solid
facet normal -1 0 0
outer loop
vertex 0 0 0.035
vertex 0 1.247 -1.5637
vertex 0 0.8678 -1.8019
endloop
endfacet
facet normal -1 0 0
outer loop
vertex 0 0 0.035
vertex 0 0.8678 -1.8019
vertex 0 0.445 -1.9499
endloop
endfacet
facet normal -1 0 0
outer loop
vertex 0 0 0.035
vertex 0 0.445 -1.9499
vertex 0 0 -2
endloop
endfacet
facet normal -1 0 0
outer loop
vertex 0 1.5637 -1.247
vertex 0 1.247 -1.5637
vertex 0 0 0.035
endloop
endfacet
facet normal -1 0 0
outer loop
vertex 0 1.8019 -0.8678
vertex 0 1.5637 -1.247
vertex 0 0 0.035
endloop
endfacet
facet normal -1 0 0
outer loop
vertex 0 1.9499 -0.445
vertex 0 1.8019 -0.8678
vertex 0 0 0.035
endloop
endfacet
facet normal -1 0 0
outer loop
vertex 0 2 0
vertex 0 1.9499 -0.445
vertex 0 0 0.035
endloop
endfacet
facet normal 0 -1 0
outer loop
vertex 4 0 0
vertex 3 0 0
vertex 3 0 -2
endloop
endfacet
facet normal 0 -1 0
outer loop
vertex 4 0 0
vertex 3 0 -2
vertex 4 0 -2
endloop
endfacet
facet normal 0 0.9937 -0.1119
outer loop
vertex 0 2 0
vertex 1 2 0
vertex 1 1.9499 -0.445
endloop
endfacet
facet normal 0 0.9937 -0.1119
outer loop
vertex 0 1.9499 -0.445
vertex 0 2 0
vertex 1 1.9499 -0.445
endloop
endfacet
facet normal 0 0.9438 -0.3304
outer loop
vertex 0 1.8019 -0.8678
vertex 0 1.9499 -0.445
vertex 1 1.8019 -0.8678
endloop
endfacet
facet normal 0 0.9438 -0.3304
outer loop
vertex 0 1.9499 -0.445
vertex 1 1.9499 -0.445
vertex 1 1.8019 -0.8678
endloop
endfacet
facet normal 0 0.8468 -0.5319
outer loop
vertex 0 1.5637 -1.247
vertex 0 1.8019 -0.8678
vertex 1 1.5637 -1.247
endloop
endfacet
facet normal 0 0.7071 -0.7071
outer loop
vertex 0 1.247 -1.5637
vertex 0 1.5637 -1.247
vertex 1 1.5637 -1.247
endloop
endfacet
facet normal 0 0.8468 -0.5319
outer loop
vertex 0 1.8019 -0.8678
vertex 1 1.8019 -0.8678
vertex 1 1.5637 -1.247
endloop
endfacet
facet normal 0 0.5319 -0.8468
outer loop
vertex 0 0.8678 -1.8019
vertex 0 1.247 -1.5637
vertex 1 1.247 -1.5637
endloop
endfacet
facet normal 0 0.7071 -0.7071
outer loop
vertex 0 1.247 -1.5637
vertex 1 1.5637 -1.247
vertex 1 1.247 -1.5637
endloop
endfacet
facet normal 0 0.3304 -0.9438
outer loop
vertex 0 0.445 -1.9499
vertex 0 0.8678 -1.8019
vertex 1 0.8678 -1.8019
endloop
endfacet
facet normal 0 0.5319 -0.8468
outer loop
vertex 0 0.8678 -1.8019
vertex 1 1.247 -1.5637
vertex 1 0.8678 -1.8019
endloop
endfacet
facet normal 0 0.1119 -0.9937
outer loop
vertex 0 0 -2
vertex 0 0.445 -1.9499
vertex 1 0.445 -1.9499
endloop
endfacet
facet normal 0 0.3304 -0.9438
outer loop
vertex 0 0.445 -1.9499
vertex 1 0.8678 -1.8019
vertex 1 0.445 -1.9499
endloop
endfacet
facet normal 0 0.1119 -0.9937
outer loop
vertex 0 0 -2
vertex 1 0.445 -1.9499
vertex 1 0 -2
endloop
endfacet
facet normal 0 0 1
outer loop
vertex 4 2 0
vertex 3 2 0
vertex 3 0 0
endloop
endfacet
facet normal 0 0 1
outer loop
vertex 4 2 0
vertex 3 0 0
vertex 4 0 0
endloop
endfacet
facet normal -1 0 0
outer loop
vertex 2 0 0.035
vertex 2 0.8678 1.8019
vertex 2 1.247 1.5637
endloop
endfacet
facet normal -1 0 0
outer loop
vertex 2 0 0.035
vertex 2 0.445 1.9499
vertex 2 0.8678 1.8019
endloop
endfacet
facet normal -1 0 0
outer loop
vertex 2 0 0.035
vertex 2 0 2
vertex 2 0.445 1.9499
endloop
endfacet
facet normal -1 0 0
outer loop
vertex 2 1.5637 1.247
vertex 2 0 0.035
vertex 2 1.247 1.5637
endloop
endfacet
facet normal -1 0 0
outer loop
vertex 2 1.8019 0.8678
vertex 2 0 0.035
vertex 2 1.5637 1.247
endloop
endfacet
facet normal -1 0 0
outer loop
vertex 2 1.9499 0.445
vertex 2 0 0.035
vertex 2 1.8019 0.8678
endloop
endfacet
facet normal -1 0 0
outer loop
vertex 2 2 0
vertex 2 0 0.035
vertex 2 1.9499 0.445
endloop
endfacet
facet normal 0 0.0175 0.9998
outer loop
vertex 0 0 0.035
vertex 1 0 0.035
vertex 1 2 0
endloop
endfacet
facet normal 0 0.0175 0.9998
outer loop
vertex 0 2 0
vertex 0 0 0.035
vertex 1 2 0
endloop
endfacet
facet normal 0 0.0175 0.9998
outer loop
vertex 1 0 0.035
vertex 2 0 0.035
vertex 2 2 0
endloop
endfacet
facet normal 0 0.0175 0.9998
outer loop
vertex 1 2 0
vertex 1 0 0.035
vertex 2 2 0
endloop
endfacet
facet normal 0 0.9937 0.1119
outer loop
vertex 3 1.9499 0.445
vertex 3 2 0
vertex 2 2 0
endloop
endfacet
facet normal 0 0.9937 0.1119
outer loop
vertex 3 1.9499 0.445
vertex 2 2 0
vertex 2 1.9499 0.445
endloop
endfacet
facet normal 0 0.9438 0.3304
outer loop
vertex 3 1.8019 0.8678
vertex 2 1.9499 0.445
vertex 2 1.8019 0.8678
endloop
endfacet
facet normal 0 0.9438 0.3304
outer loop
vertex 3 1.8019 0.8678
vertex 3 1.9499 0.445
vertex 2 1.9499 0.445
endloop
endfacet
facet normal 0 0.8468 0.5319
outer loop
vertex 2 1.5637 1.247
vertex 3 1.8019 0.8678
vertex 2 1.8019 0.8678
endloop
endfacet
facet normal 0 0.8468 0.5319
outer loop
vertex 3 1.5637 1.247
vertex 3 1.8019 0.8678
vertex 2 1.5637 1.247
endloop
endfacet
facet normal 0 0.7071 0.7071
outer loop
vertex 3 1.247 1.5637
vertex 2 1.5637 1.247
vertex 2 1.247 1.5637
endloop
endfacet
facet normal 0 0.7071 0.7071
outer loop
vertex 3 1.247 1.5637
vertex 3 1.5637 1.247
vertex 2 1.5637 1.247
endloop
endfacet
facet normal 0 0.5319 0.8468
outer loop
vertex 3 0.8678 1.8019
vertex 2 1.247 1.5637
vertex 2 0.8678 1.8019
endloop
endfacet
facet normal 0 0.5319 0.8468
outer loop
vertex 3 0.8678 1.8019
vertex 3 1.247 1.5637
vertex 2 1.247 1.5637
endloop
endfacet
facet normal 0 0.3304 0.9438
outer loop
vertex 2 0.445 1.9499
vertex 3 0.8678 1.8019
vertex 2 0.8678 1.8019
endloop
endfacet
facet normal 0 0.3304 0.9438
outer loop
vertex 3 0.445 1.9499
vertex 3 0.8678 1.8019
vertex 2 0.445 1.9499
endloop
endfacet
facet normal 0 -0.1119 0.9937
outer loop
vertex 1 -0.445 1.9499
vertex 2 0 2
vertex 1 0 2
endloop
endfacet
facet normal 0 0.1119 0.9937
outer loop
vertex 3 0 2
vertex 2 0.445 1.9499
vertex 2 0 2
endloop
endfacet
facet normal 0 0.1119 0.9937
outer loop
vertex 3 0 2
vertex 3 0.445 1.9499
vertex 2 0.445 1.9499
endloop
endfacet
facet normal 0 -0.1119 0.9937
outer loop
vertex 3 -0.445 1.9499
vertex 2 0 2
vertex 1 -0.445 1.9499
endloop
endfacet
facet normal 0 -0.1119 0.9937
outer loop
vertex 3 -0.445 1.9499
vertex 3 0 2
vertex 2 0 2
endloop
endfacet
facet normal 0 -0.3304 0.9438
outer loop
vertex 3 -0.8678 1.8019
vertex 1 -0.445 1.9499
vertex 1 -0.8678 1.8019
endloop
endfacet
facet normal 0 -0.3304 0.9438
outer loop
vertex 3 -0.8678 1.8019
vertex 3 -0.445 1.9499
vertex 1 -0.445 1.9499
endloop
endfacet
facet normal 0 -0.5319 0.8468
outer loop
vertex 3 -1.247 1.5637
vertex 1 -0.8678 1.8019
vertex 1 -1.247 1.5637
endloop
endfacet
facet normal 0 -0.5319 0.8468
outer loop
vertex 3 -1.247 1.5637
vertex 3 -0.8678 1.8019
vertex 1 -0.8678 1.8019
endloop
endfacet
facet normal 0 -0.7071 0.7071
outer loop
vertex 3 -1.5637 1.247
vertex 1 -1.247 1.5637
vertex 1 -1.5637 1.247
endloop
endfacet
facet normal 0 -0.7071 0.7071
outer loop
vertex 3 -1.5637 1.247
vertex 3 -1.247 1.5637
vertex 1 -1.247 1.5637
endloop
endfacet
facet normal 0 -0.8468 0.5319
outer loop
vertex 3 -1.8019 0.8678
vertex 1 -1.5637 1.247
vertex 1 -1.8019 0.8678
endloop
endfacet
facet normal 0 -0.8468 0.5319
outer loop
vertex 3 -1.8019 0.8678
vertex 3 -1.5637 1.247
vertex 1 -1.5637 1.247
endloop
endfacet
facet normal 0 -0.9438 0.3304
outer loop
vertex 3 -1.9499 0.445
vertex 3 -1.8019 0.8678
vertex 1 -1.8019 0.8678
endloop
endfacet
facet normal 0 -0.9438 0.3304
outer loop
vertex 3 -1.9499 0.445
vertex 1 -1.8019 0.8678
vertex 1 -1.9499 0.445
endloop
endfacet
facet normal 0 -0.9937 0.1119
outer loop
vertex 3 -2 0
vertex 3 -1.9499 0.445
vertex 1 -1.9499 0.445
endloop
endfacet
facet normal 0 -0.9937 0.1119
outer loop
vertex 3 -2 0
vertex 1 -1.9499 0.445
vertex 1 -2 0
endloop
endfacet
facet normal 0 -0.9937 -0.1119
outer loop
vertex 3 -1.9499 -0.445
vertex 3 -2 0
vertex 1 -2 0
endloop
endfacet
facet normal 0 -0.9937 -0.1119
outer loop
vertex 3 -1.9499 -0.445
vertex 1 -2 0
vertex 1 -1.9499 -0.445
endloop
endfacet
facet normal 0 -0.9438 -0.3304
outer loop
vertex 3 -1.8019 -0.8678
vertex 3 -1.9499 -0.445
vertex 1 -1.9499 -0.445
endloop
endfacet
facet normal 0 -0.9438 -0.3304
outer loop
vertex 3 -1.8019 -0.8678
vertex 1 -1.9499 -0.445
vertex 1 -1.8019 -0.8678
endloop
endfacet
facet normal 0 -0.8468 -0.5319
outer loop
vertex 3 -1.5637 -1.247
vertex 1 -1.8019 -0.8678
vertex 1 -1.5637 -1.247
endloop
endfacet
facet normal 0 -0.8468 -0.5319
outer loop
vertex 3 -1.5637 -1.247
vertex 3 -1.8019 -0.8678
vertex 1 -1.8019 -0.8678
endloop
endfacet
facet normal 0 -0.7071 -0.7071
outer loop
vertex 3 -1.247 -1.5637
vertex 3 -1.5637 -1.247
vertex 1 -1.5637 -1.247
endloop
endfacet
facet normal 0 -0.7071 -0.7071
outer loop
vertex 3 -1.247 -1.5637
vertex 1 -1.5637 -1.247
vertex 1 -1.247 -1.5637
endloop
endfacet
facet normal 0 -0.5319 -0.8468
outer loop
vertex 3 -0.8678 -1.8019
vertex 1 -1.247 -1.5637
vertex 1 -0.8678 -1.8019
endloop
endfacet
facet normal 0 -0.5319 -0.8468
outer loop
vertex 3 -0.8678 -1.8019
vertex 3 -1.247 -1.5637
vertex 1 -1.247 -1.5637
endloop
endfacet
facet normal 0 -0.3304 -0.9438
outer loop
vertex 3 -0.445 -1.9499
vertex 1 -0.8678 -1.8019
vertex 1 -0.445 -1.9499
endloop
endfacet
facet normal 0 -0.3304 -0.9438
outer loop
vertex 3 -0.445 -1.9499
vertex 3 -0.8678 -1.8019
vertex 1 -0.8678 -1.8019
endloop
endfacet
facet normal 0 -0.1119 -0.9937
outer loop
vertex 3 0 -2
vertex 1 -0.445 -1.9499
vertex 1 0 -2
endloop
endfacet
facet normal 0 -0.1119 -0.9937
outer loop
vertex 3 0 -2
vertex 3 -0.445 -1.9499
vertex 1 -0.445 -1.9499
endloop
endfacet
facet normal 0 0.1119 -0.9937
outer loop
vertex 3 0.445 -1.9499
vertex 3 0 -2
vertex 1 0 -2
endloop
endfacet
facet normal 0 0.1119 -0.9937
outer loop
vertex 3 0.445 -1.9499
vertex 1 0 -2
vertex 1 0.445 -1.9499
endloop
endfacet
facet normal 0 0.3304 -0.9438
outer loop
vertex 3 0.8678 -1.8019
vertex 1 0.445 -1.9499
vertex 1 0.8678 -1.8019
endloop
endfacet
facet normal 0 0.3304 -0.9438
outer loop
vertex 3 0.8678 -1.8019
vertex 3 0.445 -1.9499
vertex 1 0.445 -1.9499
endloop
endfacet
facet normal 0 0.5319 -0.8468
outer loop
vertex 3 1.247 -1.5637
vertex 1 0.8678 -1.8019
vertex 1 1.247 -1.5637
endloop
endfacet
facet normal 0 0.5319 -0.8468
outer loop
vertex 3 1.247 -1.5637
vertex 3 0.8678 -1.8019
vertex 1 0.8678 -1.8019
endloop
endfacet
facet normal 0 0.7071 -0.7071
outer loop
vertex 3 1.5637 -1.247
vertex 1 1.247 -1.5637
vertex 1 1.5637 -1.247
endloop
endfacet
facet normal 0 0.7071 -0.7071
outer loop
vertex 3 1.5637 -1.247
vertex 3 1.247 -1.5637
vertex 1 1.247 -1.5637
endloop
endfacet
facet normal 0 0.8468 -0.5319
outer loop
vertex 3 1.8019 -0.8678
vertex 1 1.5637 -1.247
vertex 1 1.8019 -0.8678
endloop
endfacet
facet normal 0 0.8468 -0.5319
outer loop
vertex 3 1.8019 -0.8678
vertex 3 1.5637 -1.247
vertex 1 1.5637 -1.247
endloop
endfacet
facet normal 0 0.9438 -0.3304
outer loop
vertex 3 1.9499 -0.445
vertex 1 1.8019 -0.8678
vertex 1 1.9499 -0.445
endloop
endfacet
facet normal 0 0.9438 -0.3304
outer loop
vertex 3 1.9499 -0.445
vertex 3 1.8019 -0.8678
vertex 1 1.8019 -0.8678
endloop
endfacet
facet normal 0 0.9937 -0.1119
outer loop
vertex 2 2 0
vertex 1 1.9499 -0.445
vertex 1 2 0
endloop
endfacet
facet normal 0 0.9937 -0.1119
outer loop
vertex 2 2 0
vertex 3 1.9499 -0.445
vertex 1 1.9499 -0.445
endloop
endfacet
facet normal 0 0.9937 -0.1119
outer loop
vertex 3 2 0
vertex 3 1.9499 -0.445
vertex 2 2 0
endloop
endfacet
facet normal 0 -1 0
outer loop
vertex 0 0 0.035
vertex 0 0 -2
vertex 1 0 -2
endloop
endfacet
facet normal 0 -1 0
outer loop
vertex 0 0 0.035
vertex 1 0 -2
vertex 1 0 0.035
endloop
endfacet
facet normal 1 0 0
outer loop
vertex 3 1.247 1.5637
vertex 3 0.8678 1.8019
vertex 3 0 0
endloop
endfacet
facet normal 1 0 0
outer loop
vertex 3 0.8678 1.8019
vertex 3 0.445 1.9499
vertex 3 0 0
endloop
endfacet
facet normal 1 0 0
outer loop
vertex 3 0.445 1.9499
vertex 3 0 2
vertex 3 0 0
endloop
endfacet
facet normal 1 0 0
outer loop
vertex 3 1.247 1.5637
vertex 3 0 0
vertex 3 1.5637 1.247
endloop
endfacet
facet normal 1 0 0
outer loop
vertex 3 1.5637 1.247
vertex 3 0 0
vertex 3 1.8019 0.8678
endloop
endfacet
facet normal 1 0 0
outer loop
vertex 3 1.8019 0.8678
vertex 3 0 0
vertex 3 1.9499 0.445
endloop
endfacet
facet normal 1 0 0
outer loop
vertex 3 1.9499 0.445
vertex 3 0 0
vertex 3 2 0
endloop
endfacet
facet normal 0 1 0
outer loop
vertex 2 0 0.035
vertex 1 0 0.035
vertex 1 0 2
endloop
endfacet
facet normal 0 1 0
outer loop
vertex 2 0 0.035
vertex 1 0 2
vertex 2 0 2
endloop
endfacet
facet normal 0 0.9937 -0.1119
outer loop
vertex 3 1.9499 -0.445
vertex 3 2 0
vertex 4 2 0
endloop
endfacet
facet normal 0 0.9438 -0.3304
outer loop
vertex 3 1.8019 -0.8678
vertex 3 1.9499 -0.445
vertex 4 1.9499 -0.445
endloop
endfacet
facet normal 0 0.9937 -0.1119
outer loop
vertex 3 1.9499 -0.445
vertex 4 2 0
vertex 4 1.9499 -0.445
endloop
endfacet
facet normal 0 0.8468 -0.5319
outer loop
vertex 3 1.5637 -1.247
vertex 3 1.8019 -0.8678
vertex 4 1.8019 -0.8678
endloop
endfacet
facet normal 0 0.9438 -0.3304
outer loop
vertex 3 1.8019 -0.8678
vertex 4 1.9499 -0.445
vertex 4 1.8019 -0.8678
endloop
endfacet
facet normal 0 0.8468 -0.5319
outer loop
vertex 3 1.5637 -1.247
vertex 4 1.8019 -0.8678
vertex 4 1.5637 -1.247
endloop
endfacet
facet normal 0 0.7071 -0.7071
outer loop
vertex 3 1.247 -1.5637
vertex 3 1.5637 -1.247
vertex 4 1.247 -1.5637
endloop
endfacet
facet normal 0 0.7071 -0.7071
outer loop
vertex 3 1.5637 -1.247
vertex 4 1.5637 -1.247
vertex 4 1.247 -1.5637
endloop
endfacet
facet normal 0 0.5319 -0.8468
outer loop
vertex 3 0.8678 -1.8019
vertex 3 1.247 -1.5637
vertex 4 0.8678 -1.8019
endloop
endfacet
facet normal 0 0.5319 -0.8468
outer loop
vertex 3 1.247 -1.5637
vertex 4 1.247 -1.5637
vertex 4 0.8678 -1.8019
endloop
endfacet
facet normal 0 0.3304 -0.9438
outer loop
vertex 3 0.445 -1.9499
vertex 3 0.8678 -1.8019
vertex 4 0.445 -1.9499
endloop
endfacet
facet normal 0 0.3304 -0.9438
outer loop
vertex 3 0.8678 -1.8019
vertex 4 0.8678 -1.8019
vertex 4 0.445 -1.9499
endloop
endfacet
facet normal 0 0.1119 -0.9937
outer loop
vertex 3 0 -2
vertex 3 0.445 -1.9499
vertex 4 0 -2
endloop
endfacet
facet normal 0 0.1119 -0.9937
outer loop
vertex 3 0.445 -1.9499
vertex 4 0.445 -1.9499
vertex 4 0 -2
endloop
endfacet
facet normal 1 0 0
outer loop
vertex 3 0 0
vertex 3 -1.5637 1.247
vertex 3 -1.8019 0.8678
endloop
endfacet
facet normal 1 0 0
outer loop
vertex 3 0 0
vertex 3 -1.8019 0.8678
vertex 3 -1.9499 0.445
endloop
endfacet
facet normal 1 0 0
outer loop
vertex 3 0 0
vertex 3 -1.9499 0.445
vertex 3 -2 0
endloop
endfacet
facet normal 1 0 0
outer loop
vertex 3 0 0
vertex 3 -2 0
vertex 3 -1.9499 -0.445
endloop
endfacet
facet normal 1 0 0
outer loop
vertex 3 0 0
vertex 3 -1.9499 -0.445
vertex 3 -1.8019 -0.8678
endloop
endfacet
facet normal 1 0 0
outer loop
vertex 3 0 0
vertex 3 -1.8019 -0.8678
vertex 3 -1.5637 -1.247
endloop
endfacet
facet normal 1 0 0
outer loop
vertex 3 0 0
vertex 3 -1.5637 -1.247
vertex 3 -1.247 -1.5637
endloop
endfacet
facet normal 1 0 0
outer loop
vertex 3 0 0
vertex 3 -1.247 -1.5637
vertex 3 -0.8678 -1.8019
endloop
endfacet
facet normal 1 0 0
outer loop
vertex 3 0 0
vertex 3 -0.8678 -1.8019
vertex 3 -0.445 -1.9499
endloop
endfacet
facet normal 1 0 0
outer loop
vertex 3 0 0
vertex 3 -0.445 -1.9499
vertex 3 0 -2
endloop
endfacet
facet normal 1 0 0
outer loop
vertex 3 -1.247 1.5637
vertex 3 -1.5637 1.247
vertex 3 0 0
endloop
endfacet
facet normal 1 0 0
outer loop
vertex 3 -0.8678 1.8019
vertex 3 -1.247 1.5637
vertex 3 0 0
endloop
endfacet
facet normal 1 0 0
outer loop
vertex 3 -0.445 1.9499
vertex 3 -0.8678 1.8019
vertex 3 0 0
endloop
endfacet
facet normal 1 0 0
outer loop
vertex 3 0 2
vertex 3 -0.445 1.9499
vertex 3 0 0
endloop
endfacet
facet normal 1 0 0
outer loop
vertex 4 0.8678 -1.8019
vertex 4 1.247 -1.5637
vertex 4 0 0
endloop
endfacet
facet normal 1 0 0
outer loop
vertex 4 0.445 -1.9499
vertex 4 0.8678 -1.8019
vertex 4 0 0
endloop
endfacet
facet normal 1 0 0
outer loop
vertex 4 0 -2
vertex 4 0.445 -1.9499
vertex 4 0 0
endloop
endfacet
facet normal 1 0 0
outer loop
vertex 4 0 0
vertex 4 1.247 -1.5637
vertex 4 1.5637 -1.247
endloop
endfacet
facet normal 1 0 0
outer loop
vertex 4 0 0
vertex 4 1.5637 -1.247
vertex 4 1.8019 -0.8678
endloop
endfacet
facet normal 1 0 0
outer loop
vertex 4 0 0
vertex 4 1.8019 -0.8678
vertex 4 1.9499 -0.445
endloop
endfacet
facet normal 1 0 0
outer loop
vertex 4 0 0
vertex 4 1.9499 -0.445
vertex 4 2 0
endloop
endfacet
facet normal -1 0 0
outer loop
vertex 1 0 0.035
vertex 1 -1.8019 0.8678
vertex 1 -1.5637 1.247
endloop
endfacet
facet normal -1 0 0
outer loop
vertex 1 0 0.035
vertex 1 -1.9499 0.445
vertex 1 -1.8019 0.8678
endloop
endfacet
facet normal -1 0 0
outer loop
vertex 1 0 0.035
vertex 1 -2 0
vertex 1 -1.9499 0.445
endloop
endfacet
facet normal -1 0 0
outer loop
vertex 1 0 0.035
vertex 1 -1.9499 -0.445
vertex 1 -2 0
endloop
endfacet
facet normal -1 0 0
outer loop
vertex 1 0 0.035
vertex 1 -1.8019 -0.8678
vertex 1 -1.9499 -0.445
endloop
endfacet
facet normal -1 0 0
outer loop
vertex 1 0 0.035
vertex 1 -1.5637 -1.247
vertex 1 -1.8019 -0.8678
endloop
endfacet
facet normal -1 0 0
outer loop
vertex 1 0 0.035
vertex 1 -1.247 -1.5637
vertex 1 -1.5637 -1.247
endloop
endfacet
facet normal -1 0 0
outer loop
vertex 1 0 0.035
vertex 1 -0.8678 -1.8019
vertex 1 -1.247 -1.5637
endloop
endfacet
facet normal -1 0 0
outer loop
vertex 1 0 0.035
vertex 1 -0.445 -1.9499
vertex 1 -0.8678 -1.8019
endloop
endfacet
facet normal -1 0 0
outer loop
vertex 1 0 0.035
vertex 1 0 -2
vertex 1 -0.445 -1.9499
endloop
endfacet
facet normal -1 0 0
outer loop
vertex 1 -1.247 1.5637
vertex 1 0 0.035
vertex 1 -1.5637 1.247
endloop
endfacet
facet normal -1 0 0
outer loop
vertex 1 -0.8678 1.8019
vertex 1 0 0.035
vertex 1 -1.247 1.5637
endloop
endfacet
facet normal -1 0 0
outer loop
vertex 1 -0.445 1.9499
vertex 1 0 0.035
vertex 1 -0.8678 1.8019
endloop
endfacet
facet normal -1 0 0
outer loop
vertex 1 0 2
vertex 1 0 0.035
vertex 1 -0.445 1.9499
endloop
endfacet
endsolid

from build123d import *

# Parameters (mm, degrees)
SKETCH5_W           = 4
SKETCH5_H           = 2
SKETCH6_W           = 1
SKETCH6_H           = 2
CUT_EXTRUDE5_DEPTH  = 11
SKETCH8_W           = 0.5
SKETCH8_H           = 2
CUT_EXTRUDE7_DEPTH  = 10
SKETCH9_W           = 1.5
SKETCH9_H           = 2
CUT_EXTRUDE8_DEPTH  = 10
BOSS_EXTRUDE1_DEPTH = 4
SKETCH13_W          = 4.449870591
SKETCH13_H          = 3.198188742
CUT_EXTRUDE10_DEPTH = 1
SKETCH14_W          = 1
SKETCH14_H          = 2
CUT_EXTRUDE11_DEPTH = 10
SKETCH15_W          = 1
SKETCH15_H          = 2
CUT_EXTRUDE12_DEPTH = 5


with BuildPart() as part:
    # Sketch5 → Revolve-Thin2 (revolve)
    with BuildSketch(Plane.XY):
        with Locations((2, 1)):
            Rectangle(SKETCH5_W, SKETCH5_H)
    revolve(axis=Axis((0, 0, 0), (1, 0, 0)))

    # Sketch6 → Cut-Extrude5 (cut)
    with BuildSketch(Plane.XY):
        with Locations((3.5, 1)):
            Rectangle(SKETCH6_W, SKETCH6_H)
        with Locations((0.5, 1)):
            Rectangle(SKETCH6_W, SKETCH6_H)
    extrude(amount=-CUT_EXTRUDE5_DEPTH, mode=Mode.SUBTRACT)

    # Sketch8 → Cut-Extrude7 (cut)
    with BuildSketch(Plane(origin=(0, 0, 0), x_dir=(-1, 0, 0), z_dir=(0, 0, -1))):
        with Locations((-0.25, 1)):
            Rectangle(SKETCH8_W, SKETCH8_H)
    extrude(amount=-CUT_EXTRUDE7_DEPTH, mode=Mode.SUBTRACT)

    # Sketch9 → Cut-Extrude8 (cut)
    with BuildSketch(Plane(origin=(0, 0, 0), x_dir=(-1, 0, 0), z_dir=(0, 0, -1))):
        with Locations((-1.25, 1)):
            Rectangle(SKETCH9_W, SKETCH9_H)
    extrude(amount=-CUT_EXTRUDE8_DEPTH, mode=Mode.SUBTRACT)

    # Sketch10 → Boss-Extrude1 (add)
    with BuildSketch(Plane(origin=(4, 0, 0), x_dir=(0, 0, -1), z_dir=(1, 0, 0))):
        with BuildLine():
            Line((2, 0), (-0.034977088, 0))
            Line((-0.034977088, 0), (0, 2))
            ThreePointArc((0, 2), (1.414213562, 1.414213562), (2, 0))
        make_face()
    extrude(amount=-BOSS_EXTRUDE1_DEPTH)

    # Sketch13 → Cut-Extrude10 (cut)
    with BuildSketch(Plane.ZY):
        with Locations((-0.224935296, -1.599094371)):
            Rectangle(SKETCH13_W, SKETCH13_H)
    extrude(amount=-CUT_EXTRUDE10_DEPTH, mode=Mode.SUBTRACT)

    # Sketch14 → Cut-Extrude11 (cut)
    with BuildSketch(Plane.XY):
        with Locations((3.5, 1)):
            Rectangle(SKETCH14_W, SKETCH14_H)
    extrude(amount=CUT_EXTRUDE11_DEPTH, mode=Mode.SUBTRACT)

    # Sketch15 → Cut-Extrude12 (cut, symmetric)
    with BuildSketch(Plane.XY):
        with Locations((3.5, -1)):
            Rectangle(SKETCH15_W, SKETCH15_H)
    extrude(amount=CUT_EXTRUDE12_DEPTH, both=True, mode=Mode.SUBTRACT)


solid = part.part
